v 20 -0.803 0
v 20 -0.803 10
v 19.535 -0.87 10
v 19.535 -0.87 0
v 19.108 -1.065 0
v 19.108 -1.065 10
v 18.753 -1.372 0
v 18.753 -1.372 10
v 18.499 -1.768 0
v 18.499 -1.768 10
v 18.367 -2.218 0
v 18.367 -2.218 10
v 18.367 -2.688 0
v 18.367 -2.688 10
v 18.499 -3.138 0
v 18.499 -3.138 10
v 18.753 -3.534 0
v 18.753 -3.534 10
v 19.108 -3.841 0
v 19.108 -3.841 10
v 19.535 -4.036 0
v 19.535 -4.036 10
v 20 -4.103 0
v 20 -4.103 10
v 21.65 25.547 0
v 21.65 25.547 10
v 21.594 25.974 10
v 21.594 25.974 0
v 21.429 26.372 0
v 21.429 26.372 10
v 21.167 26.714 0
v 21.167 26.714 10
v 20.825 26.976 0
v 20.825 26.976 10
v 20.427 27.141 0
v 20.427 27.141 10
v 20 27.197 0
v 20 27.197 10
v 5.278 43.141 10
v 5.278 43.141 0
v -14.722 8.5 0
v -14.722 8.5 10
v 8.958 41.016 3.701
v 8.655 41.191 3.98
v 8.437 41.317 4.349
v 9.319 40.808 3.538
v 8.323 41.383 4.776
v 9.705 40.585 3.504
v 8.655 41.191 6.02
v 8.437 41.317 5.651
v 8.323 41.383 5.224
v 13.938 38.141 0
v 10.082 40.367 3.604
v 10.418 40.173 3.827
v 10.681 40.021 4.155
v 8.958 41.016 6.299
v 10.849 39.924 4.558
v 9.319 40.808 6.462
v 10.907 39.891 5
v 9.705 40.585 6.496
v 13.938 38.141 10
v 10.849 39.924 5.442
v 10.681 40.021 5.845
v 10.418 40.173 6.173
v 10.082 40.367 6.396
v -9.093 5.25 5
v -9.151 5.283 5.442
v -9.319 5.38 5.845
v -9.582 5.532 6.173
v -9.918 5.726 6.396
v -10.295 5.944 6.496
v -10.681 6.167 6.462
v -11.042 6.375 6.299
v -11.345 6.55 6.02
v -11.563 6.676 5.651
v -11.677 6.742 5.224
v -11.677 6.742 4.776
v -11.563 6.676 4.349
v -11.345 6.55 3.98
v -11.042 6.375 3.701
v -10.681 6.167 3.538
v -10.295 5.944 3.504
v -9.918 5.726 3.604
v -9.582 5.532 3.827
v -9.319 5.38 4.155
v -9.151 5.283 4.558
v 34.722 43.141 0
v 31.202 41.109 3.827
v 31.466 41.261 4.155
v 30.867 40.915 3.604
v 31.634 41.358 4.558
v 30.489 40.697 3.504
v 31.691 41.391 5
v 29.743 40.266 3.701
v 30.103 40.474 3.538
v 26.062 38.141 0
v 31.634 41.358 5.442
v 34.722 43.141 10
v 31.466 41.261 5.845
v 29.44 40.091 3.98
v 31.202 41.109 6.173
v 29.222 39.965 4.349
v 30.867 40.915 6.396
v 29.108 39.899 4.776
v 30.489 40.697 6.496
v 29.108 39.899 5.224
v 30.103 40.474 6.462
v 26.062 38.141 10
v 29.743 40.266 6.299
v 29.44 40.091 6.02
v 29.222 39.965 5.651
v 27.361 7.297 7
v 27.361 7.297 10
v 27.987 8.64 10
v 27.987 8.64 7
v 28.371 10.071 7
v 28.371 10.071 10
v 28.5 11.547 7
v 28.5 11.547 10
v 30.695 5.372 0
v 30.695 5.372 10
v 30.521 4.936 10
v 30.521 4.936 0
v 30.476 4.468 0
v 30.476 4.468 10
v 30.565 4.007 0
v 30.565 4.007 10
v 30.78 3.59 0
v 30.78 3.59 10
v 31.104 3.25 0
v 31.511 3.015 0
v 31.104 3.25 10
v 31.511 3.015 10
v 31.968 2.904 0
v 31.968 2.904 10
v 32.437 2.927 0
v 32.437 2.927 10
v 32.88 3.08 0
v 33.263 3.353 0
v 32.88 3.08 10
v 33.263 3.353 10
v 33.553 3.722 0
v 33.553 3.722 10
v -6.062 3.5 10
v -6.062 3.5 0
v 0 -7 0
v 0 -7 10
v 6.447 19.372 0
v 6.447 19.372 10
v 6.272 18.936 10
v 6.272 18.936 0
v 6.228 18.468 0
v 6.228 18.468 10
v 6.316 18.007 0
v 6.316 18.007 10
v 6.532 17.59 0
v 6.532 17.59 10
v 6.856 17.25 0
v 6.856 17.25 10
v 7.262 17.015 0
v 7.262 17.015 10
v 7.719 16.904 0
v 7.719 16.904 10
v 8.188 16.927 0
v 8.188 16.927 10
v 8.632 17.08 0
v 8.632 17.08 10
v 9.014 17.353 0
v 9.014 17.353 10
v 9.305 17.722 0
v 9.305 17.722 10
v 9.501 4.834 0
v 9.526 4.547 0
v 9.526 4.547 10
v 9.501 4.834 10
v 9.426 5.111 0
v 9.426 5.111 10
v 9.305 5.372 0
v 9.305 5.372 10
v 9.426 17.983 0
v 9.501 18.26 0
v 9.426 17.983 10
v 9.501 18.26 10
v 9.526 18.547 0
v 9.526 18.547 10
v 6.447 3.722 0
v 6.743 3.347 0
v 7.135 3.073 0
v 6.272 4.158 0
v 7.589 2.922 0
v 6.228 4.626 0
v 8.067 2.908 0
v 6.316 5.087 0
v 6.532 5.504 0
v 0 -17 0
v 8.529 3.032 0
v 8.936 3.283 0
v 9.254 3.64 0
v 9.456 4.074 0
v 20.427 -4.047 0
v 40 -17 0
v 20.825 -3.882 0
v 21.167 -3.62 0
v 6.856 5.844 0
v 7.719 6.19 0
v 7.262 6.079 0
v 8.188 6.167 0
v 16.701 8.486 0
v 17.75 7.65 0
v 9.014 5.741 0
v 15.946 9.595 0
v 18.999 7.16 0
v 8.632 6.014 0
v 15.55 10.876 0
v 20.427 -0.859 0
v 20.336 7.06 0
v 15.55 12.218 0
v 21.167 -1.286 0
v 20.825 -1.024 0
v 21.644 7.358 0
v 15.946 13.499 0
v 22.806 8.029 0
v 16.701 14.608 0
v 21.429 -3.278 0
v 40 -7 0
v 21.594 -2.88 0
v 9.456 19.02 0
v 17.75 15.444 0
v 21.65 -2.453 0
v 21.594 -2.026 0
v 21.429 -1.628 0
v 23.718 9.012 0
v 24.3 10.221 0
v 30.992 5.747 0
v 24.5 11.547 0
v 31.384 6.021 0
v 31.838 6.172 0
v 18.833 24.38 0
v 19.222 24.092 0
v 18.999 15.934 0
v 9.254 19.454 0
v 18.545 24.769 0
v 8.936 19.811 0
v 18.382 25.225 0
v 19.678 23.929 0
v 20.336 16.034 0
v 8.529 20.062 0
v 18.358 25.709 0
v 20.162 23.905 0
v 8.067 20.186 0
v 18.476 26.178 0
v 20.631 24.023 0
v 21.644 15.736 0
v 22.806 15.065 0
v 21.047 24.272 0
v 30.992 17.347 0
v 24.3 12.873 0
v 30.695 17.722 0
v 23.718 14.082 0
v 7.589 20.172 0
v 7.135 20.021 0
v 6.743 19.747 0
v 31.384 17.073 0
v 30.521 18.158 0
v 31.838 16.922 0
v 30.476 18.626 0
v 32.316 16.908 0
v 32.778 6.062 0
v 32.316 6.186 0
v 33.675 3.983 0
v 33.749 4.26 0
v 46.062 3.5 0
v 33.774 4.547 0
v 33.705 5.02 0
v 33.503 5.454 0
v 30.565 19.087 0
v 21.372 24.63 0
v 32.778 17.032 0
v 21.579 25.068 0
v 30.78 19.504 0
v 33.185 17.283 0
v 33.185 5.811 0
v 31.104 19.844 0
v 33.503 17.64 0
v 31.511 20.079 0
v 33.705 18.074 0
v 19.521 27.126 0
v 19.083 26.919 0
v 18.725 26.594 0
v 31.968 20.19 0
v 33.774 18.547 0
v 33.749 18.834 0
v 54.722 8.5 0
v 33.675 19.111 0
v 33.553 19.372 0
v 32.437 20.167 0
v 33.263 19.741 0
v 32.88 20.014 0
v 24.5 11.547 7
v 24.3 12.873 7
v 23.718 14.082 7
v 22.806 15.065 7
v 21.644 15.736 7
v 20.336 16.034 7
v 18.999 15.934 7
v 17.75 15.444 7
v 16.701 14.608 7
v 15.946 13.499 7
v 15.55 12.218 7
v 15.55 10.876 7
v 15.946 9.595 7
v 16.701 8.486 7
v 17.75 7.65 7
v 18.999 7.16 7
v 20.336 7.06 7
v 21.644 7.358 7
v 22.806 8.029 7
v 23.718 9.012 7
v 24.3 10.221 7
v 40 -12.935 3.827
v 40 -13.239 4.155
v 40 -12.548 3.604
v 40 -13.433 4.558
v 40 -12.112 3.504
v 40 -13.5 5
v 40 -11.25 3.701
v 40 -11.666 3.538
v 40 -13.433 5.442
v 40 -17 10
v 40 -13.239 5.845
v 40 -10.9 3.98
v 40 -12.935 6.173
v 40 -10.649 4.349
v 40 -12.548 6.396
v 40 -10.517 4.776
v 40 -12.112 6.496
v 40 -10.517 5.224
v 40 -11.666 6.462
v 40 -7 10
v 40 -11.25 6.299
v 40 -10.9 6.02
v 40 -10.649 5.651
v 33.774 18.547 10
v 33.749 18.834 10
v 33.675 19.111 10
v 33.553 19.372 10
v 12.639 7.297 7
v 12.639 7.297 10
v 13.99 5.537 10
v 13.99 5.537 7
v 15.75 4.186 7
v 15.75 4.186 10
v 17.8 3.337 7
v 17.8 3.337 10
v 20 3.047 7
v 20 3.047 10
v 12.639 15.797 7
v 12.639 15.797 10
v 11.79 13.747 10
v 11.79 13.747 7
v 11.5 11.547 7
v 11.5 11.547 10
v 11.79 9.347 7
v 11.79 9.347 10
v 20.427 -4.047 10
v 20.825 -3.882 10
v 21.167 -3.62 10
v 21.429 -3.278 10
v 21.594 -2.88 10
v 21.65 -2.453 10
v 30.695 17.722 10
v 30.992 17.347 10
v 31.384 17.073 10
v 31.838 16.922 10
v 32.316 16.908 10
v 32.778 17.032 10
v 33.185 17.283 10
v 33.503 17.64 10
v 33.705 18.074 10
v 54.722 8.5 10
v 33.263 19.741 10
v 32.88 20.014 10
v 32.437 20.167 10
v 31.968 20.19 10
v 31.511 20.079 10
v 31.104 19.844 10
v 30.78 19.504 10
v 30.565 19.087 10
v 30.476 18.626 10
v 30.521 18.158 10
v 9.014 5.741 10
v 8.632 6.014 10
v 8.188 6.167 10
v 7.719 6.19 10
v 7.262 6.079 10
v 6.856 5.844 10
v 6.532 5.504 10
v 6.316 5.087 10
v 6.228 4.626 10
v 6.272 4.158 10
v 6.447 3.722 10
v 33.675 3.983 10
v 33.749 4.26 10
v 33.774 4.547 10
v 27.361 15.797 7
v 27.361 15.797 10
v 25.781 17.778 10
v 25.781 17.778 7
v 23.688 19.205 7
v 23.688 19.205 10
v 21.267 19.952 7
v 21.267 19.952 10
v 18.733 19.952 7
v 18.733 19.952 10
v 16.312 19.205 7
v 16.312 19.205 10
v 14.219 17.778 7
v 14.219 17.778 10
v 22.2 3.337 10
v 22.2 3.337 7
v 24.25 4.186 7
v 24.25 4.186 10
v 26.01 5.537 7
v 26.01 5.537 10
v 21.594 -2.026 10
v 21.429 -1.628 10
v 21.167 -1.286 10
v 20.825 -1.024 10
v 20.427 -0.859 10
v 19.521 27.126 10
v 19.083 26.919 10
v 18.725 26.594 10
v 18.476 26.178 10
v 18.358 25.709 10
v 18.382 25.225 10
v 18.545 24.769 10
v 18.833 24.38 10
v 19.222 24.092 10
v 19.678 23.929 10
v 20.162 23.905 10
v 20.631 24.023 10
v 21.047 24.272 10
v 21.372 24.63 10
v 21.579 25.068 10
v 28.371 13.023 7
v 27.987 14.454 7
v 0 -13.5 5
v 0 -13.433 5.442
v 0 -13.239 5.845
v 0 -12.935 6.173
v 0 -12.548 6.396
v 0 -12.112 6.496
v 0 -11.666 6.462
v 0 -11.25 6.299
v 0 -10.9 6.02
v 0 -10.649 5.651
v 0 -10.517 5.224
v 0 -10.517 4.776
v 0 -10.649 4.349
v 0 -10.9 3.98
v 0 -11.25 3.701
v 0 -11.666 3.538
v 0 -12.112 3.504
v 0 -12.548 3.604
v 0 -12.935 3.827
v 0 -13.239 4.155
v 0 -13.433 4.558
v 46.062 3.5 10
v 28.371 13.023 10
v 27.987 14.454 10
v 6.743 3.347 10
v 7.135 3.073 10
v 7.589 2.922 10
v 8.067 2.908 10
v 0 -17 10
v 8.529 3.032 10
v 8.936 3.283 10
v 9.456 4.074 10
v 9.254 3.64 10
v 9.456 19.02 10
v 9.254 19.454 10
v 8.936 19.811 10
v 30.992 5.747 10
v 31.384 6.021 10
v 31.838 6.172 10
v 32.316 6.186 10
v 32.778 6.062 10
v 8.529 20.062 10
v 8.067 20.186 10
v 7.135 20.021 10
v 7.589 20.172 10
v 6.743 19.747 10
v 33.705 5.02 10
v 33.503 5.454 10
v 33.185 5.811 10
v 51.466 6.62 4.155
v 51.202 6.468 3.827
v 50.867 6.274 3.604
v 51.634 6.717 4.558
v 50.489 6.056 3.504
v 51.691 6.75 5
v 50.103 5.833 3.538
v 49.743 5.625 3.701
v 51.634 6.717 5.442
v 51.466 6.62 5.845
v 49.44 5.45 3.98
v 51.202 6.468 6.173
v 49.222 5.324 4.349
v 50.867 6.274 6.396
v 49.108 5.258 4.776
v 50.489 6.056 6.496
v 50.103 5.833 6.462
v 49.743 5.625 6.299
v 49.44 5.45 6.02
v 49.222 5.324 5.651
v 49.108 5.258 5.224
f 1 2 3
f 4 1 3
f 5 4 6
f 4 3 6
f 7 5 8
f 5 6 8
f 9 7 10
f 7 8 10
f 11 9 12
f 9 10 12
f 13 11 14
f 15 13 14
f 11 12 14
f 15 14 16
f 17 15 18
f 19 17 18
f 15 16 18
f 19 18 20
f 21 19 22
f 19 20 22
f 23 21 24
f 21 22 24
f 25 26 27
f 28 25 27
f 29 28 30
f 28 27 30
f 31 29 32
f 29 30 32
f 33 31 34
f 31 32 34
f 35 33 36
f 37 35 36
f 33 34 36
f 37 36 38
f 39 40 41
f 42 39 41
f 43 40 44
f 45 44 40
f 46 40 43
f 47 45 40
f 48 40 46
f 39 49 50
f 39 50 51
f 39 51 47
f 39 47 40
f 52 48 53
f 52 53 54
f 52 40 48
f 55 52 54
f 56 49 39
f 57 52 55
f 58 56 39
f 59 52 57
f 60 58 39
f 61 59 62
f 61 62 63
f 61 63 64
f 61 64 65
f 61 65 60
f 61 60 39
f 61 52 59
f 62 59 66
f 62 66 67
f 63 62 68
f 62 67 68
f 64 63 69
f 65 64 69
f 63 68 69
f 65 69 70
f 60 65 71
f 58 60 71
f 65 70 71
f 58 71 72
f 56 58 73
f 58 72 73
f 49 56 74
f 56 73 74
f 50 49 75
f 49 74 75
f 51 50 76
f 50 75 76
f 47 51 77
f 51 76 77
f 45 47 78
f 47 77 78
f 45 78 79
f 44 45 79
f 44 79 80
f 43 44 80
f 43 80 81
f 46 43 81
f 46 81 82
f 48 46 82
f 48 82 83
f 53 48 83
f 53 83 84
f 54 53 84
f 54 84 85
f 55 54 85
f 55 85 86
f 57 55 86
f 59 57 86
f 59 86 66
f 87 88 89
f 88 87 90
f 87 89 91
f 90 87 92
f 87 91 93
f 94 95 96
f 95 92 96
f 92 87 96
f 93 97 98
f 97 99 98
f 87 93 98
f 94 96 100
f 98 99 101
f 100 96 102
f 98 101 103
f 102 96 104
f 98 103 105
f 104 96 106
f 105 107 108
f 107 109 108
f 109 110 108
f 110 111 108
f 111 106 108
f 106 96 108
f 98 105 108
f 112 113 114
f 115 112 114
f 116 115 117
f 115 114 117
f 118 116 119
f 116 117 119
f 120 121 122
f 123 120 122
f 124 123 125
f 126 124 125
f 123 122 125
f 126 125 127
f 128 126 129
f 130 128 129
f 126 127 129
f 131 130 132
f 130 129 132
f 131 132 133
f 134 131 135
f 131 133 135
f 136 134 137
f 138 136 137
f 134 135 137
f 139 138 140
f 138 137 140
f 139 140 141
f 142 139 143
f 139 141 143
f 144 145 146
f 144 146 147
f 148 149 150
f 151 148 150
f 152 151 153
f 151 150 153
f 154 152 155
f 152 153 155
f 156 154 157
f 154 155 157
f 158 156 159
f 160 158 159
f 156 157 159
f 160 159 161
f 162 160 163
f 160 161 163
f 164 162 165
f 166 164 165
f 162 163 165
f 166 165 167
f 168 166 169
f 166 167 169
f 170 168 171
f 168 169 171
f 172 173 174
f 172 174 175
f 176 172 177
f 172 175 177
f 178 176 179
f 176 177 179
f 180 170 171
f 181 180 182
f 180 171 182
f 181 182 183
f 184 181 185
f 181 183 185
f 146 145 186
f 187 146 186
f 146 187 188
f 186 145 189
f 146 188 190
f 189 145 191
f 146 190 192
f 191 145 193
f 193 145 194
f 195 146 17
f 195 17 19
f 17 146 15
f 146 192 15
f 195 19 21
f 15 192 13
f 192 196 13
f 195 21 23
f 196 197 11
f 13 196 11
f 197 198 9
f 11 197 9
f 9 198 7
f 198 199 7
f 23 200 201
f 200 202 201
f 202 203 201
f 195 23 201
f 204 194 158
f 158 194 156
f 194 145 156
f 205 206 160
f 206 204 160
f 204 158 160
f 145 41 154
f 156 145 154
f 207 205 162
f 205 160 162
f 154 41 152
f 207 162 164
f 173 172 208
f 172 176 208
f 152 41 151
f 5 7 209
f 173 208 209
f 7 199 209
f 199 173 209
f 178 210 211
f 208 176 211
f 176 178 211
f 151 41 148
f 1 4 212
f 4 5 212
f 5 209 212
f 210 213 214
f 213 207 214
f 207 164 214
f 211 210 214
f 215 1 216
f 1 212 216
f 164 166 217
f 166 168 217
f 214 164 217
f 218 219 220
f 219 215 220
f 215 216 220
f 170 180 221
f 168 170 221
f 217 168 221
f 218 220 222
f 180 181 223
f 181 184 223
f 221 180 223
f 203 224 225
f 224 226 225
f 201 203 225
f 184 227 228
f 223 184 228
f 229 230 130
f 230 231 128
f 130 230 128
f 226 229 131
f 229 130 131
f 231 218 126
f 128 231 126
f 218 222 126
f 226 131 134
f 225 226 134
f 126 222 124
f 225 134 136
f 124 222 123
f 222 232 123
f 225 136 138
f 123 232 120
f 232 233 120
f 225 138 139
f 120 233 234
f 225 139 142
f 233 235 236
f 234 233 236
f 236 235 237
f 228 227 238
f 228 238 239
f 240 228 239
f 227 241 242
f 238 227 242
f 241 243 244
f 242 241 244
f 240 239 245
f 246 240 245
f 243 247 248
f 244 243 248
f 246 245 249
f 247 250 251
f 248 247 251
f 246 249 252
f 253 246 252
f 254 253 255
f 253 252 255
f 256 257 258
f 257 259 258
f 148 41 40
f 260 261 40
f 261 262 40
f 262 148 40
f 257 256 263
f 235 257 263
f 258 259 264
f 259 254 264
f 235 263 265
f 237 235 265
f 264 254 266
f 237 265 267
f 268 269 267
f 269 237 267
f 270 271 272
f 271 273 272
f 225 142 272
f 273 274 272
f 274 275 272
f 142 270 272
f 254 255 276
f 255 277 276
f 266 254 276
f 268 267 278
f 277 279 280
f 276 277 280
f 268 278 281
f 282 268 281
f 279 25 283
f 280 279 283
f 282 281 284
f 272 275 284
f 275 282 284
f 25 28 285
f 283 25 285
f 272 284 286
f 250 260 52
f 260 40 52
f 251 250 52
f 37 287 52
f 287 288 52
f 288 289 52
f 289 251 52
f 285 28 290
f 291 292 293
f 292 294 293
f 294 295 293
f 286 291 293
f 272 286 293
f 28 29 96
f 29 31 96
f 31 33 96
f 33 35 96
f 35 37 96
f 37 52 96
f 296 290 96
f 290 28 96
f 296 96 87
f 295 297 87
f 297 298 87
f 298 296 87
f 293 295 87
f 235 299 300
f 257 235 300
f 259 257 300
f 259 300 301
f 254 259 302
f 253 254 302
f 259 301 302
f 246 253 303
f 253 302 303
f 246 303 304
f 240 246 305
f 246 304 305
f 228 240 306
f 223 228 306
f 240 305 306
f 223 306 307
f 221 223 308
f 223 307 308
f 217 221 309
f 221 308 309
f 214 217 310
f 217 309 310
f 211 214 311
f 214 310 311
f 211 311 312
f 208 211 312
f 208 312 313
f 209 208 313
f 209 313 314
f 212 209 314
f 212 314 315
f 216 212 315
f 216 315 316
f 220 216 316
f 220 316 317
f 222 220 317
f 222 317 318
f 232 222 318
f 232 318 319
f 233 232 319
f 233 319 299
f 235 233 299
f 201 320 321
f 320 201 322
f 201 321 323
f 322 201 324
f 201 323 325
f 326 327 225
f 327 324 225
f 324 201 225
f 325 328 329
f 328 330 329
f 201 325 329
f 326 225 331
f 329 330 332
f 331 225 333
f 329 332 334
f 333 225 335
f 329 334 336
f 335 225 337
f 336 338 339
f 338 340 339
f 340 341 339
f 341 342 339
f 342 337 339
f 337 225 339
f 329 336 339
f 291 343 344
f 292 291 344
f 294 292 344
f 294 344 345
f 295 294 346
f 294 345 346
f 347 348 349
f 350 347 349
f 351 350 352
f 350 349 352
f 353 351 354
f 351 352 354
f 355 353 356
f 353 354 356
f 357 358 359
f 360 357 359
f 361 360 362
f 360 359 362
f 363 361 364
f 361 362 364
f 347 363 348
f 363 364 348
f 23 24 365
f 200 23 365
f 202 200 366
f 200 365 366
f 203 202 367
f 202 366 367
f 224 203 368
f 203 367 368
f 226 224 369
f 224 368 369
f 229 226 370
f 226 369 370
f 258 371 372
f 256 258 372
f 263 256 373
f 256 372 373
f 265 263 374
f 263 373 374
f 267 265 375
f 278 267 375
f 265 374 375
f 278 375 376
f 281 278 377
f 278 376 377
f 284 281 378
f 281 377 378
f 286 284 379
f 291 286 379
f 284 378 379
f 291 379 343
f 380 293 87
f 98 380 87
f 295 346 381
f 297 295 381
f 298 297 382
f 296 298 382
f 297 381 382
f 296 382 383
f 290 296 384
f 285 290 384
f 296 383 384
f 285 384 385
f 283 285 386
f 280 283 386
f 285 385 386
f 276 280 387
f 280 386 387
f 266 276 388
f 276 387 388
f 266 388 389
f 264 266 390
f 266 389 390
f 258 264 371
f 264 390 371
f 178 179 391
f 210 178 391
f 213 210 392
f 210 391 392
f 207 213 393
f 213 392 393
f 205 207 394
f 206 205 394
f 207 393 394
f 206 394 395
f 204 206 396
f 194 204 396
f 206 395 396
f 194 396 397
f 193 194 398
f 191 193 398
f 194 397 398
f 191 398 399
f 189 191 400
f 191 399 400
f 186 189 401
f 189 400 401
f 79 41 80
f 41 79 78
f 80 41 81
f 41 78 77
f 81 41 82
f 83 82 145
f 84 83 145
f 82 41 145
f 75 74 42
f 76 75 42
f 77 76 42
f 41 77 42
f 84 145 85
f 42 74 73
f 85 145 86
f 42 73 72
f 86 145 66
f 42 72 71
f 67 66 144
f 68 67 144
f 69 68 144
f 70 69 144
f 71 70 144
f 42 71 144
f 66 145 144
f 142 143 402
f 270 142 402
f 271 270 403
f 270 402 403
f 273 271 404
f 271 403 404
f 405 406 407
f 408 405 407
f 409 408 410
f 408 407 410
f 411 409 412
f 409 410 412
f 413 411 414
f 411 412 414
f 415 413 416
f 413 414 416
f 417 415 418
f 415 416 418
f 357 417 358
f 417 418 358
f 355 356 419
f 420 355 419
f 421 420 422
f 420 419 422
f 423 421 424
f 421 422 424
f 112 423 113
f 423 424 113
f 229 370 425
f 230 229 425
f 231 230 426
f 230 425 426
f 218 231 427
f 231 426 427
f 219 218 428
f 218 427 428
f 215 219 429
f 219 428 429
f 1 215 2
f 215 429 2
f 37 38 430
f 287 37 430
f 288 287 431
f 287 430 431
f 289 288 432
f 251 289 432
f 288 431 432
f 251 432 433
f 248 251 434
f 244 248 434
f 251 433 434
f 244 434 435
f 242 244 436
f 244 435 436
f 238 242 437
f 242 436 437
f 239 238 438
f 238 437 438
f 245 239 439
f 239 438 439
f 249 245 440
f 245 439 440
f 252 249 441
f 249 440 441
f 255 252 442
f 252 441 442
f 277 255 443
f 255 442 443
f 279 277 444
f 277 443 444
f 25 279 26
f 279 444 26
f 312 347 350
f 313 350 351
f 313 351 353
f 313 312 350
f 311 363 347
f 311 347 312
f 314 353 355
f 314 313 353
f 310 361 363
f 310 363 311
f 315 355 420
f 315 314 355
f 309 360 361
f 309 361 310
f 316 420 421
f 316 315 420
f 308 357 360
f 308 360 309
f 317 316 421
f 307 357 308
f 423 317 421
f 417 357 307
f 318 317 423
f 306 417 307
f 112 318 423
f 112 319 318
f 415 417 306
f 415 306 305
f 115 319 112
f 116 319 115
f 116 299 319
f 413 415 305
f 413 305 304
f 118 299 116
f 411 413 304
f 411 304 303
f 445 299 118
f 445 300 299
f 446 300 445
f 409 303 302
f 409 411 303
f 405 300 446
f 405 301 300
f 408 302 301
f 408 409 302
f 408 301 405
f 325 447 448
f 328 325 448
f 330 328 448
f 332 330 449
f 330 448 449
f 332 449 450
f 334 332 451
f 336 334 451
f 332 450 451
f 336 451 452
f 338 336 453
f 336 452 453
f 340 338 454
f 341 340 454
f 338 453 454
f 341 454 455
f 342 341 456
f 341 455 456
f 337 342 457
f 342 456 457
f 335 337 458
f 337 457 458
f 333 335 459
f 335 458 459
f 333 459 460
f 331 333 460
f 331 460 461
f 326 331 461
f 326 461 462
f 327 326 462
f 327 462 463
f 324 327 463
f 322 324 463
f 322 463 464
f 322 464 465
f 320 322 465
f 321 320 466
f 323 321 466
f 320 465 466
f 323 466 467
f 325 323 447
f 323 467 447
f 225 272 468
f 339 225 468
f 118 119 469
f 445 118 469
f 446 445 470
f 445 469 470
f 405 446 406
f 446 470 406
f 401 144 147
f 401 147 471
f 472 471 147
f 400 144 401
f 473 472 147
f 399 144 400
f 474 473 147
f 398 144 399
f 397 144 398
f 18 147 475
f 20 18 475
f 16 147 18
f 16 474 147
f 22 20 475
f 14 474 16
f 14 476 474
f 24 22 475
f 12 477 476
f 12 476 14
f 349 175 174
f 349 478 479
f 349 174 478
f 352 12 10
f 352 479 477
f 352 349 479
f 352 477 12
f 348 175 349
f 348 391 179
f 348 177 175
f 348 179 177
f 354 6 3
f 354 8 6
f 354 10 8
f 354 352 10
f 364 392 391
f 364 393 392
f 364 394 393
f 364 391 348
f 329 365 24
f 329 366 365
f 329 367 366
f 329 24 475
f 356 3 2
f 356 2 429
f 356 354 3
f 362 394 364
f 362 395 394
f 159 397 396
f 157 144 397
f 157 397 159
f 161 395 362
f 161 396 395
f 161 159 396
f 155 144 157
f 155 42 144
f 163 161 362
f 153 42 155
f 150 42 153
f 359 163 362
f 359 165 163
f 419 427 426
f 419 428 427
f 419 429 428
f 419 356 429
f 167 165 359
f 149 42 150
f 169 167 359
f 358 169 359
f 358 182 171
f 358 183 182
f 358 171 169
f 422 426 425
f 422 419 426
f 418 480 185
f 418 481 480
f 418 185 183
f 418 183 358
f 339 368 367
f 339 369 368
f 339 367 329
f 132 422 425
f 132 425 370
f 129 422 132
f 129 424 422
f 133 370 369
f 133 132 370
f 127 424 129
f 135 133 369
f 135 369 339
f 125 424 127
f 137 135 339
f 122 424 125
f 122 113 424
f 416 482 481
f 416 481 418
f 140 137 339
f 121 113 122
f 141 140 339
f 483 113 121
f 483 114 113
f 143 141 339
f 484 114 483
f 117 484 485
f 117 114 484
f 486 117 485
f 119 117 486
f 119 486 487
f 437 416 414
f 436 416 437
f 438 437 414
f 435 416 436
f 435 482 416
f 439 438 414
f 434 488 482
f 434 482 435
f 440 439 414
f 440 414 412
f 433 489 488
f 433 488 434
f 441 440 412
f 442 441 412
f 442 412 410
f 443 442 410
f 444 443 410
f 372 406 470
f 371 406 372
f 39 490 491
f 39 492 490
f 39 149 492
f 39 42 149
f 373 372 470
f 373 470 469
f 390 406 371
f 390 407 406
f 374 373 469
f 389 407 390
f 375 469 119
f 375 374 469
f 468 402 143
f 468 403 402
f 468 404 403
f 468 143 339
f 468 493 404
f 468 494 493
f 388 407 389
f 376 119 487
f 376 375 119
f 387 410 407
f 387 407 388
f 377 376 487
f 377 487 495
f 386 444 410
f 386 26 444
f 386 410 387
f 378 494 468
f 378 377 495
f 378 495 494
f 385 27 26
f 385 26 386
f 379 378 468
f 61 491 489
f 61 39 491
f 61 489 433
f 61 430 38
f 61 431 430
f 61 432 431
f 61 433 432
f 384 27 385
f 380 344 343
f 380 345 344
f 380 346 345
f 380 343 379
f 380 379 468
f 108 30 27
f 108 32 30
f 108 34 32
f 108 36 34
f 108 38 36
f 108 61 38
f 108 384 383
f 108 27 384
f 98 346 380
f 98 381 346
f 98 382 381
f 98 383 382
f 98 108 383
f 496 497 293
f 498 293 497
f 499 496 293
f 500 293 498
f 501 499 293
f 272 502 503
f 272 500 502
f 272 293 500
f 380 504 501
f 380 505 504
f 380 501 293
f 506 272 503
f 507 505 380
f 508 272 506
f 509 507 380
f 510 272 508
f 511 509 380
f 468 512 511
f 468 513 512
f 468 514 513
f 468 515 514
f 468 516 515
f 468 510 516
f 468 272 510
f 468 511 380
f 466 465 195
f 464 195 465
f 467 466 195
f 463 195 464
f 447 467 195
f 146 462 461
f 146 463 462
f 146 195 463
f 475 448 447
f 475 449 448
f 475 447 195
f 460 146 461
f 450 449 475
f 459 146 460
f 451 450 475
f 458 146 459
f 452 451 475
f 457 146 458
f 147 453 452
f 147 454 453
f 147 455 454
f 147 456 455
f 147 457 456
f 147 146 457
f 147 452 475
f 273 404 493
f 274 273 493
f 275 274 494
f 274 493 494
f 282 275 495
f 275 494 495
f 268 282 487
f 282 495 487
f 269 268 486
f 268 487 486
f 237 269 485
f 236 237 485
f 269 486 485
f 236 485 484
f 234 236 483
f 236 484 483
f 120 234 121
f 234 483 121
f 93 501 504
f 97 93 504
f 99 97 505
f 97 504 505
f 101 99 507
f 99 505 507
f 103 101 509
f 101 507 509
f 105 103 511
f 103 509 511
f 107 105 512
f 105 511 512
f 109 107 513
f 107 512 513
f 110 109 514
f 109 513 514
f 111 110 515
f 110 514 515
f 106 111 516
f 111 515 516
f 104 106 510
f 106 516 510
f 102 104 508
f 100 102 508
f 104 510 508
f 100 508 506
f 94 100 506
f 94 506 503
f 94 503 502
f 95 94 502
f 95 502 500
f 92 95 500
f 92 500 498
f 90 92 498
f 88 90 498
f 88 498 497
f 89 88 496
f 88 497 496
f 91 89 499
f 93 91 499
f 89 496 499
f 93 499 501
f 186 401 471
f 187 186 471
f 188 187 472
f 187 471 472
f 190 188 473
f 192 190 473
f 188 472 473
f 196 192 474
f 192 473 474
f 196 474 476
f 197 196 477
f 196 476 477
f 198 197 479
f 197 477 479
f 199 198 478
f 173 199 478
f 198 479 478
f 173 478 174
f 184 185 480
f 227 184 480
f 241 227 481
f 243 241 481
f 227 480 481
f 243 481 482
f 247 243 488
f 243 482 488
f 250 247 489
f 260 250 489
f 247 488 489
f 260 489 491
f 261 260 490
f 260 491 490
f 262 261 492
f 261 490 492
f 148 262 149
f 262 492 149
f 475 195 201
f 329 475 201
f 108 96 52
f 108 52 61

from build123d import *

# Parameters (mm, degrees)
F1_DEPTH  = 10
F2_DEPTH  = 17
F3_DEPTH  = 17
F4_DEPTH  = 17
F5_R      = 4.5
F6_DEPTH  = 25
F7_DEPTH  = 3
F8_SIZE   = 7
F9_R      = 1.5
F10_DEPTH = 45.3
F11_R     = 1.5
F12_DEPTH = 40
F13_R     = 1.5
F14_DEPTH = 40


with BuildPart() as f1:
    # F0 (on Top) → F1 (new body)
    with BuildSketch(Plane.XY):
        Polygon((20, 34.6410161514), (0, 0), (40, 0), align=None)
    extrude(amount=F1_DEPTH)

    # F2 (add): a face of the model
    f2_faces = [f1.faces().sort_by_distance(p)[0] for p in [
        (10, 17.3205080757, 5),
    ]]
    extrude(f2_faces, amount=F2_DEPTH)

    # F3 (add): a face of the model
    f3_faces = [f1.faces().sort_by_distance(p)[0] for p in [
        (30, 17.3205080757, 5),
    ]]
    extrude(f3_faces, amount=F3_DEPTH)

    # F4 (add): a face of the model
    f4_faces = [f1.faces().sort_by_distance(p)[0] for p in [
        (20, 0, 5),
    ]]
    extrude(f4_faces, amount=F4_DEPTH)

    # F5 (on face) → F6 (cut)
    with BuildSketch(Plane.XY.offset(10)):
        with BuildLine():
            ThreePointArc((9.525644347, 18.5470053838), (8.3026957714, 20.1407829972), (6.4467024308, 19.3720053838))
            ThreePointArc((6.4467024308, 19.3720053838), (7.050644347, 17.1180634675), (9.3045862633, 17.7220053838))
            ThreePointArc((9.3045862633, 17.7220053838), (9.4694219604, 18.1199539594), (9.525644347, 18.5470053838))
        make_face()
        with BuildLine():
            ThreePointArc((21.65, 25.5470053838), (21.166726189, 26.7137315728), (20, 27.1970053838))
            ThreePointArc((20, 27.1970053838), (18.833273811, 24.3802791948), (21.65, 25.5470053838))
        make_face()
        with BuildLine():
            ThreePointArc((33.774355653, 18.5470053838), (33.7181332664, 18.9740568082), (33.5532975692, 19.3720053838))
            ThreePointArc((33.5532975692, 19.3720053838), (31.299355653, 19.9759473), (30.6954137367, 17.7220053838))
            ThreePointArc((30.6954137367, 17.7220053838), (32.5514070774, 16.9532277704), (33.774355653, 18.5470053838))
        make_face()
        with BuildLine():
            ThreePointArc((30.6954137367, 5.3720053838), (31.299355653, 3.1180634675), (33.5532975692, 3.7220053838))
            ThreePointArc((33.5532975692, 3.7220053838), (33.7181332664, 4.1199539594), (33.774355653, 4.5470053838))
            ThreePointArc((33.774355653, 4.5470053838), (32.5514070774, 6.1407829972), (30.6954137367, 5.3720053838))
        make_face()
        with BuildLine():
            ThreePointArc((20, -0.8029946162), (18.35, -2.4529946162), (20, -4.1029946162))
            ThreePointArc((20, -4.1029946162), (21.166726189, -3.6197208052), (21.65, -2.4529946162))
            ThreePointArc((21.65, -2.4529946162), (21.166726189, -1.2862684272), (20, -0.8029946162))
        make_face()
        with BuildLine():
            ThreePointArc((9.3045862633, 5.3720053838), (7.050644347, 5.9759473), (6.4467024308, 3.7220053838))
            ThreePointArc((6.4467024308, 3.7220053838), (8.3026957714, 2.9532277704), (9.525644347, 4.5470053838))
            ThreePointArc((9.525644347, 4.5470053838), (9.4694219604, 4.9740568082), (9.3045862633, 5.3720053838))
        make_face()
        with Locations((20, 11.5470053838)):
            Circle(F5_R)
    extrude(amount=-F6_DEPTH, mode=Mode.SUBTRACT)

    # F5 (on face) → F7 (cut)
    with BuildSketch(Plane.XY.offset(10)):
        with BuildLine():
            ThreePointArc((28.5, 11.5470053838), (28.2103695235, 13.7469672672), (27.3612159322, 15.7970053838))
            ThreePointArc((27.3612159322, 15.7970053838), (20, 20.0470053838), (12.6387840678, 15.7970053838))
            ThreePointArc((12.6387840678, 15.7970053838), (11.5, 11.5470053838), (12.6387840678, 7.2970053838))
            ThreePointArc((12.6387840678, 7.2970053838), (15.75, 4.1857894516), (20, 3.0470053838))
            ThreePointArc((20, 3.0470053838), (24.25, 4.1857894516), (27.3612159322, 7.2970053838))
            ThreePointArc((27.3612159322, 7.2970053838), (28.2103695235, 9.3470435004), (28.5, 11.5470053838))
        make_face()
        with Locations((20, 11.5470053838)):
            Circle(F5_R, mode=Mode.SUBTRACT)
    extrude(amount=-F7_DEPTH, mode=Mode.SUBTRACT)

    # F8
    f8_edges = [f1.edges().sort_by_distance(p)[0] for p in [
        (0, 0, 5),
        (40, 0, 5),
        (20, 34.641016, 5),
    ]]
    chamfer(f8_edges, length=F8_SIZE)

    # F9 (on face) → F10 (cut)
    with BuildSketch(Plane(origin=(0, 0, 0), x_dir=(0.8660254038, -0.5, 0), z_dir=(-0.5, -0.8660254038, 0))):
        with Locations((-12, 5)):
            Circle(F9_R)
    extrude(amount=-F10_DEPTH, mode=Mode.SUBTRACT)

    # F11 (on face) → F12 (cut)
    with BuildSketch(Plane(origin=(0, 0, 0), x_dir=(0, -1, 0), z_dir=(-1, 0, 0))):
        with Locations((12, 5)):
            Circle(F11_R)
    extrude(amount=-F12_DEPTH, mode=Mode.SUBTRACT)

    # F13 (on face) → F14 (cut)
    with BuildSketch(Plane(origin=(10, -17.3205080757, 0), x_dir=(0.8660254038, 0.5, 0), z_dir=(0.5, -0.8660254038, 0))):
        with Locations((46.6410161514, 5)):
            Circle(F13_R)
    extrude(amount=-F14_DEPTH, mode=Mode.SUBTRACT)


solid = f1.part
